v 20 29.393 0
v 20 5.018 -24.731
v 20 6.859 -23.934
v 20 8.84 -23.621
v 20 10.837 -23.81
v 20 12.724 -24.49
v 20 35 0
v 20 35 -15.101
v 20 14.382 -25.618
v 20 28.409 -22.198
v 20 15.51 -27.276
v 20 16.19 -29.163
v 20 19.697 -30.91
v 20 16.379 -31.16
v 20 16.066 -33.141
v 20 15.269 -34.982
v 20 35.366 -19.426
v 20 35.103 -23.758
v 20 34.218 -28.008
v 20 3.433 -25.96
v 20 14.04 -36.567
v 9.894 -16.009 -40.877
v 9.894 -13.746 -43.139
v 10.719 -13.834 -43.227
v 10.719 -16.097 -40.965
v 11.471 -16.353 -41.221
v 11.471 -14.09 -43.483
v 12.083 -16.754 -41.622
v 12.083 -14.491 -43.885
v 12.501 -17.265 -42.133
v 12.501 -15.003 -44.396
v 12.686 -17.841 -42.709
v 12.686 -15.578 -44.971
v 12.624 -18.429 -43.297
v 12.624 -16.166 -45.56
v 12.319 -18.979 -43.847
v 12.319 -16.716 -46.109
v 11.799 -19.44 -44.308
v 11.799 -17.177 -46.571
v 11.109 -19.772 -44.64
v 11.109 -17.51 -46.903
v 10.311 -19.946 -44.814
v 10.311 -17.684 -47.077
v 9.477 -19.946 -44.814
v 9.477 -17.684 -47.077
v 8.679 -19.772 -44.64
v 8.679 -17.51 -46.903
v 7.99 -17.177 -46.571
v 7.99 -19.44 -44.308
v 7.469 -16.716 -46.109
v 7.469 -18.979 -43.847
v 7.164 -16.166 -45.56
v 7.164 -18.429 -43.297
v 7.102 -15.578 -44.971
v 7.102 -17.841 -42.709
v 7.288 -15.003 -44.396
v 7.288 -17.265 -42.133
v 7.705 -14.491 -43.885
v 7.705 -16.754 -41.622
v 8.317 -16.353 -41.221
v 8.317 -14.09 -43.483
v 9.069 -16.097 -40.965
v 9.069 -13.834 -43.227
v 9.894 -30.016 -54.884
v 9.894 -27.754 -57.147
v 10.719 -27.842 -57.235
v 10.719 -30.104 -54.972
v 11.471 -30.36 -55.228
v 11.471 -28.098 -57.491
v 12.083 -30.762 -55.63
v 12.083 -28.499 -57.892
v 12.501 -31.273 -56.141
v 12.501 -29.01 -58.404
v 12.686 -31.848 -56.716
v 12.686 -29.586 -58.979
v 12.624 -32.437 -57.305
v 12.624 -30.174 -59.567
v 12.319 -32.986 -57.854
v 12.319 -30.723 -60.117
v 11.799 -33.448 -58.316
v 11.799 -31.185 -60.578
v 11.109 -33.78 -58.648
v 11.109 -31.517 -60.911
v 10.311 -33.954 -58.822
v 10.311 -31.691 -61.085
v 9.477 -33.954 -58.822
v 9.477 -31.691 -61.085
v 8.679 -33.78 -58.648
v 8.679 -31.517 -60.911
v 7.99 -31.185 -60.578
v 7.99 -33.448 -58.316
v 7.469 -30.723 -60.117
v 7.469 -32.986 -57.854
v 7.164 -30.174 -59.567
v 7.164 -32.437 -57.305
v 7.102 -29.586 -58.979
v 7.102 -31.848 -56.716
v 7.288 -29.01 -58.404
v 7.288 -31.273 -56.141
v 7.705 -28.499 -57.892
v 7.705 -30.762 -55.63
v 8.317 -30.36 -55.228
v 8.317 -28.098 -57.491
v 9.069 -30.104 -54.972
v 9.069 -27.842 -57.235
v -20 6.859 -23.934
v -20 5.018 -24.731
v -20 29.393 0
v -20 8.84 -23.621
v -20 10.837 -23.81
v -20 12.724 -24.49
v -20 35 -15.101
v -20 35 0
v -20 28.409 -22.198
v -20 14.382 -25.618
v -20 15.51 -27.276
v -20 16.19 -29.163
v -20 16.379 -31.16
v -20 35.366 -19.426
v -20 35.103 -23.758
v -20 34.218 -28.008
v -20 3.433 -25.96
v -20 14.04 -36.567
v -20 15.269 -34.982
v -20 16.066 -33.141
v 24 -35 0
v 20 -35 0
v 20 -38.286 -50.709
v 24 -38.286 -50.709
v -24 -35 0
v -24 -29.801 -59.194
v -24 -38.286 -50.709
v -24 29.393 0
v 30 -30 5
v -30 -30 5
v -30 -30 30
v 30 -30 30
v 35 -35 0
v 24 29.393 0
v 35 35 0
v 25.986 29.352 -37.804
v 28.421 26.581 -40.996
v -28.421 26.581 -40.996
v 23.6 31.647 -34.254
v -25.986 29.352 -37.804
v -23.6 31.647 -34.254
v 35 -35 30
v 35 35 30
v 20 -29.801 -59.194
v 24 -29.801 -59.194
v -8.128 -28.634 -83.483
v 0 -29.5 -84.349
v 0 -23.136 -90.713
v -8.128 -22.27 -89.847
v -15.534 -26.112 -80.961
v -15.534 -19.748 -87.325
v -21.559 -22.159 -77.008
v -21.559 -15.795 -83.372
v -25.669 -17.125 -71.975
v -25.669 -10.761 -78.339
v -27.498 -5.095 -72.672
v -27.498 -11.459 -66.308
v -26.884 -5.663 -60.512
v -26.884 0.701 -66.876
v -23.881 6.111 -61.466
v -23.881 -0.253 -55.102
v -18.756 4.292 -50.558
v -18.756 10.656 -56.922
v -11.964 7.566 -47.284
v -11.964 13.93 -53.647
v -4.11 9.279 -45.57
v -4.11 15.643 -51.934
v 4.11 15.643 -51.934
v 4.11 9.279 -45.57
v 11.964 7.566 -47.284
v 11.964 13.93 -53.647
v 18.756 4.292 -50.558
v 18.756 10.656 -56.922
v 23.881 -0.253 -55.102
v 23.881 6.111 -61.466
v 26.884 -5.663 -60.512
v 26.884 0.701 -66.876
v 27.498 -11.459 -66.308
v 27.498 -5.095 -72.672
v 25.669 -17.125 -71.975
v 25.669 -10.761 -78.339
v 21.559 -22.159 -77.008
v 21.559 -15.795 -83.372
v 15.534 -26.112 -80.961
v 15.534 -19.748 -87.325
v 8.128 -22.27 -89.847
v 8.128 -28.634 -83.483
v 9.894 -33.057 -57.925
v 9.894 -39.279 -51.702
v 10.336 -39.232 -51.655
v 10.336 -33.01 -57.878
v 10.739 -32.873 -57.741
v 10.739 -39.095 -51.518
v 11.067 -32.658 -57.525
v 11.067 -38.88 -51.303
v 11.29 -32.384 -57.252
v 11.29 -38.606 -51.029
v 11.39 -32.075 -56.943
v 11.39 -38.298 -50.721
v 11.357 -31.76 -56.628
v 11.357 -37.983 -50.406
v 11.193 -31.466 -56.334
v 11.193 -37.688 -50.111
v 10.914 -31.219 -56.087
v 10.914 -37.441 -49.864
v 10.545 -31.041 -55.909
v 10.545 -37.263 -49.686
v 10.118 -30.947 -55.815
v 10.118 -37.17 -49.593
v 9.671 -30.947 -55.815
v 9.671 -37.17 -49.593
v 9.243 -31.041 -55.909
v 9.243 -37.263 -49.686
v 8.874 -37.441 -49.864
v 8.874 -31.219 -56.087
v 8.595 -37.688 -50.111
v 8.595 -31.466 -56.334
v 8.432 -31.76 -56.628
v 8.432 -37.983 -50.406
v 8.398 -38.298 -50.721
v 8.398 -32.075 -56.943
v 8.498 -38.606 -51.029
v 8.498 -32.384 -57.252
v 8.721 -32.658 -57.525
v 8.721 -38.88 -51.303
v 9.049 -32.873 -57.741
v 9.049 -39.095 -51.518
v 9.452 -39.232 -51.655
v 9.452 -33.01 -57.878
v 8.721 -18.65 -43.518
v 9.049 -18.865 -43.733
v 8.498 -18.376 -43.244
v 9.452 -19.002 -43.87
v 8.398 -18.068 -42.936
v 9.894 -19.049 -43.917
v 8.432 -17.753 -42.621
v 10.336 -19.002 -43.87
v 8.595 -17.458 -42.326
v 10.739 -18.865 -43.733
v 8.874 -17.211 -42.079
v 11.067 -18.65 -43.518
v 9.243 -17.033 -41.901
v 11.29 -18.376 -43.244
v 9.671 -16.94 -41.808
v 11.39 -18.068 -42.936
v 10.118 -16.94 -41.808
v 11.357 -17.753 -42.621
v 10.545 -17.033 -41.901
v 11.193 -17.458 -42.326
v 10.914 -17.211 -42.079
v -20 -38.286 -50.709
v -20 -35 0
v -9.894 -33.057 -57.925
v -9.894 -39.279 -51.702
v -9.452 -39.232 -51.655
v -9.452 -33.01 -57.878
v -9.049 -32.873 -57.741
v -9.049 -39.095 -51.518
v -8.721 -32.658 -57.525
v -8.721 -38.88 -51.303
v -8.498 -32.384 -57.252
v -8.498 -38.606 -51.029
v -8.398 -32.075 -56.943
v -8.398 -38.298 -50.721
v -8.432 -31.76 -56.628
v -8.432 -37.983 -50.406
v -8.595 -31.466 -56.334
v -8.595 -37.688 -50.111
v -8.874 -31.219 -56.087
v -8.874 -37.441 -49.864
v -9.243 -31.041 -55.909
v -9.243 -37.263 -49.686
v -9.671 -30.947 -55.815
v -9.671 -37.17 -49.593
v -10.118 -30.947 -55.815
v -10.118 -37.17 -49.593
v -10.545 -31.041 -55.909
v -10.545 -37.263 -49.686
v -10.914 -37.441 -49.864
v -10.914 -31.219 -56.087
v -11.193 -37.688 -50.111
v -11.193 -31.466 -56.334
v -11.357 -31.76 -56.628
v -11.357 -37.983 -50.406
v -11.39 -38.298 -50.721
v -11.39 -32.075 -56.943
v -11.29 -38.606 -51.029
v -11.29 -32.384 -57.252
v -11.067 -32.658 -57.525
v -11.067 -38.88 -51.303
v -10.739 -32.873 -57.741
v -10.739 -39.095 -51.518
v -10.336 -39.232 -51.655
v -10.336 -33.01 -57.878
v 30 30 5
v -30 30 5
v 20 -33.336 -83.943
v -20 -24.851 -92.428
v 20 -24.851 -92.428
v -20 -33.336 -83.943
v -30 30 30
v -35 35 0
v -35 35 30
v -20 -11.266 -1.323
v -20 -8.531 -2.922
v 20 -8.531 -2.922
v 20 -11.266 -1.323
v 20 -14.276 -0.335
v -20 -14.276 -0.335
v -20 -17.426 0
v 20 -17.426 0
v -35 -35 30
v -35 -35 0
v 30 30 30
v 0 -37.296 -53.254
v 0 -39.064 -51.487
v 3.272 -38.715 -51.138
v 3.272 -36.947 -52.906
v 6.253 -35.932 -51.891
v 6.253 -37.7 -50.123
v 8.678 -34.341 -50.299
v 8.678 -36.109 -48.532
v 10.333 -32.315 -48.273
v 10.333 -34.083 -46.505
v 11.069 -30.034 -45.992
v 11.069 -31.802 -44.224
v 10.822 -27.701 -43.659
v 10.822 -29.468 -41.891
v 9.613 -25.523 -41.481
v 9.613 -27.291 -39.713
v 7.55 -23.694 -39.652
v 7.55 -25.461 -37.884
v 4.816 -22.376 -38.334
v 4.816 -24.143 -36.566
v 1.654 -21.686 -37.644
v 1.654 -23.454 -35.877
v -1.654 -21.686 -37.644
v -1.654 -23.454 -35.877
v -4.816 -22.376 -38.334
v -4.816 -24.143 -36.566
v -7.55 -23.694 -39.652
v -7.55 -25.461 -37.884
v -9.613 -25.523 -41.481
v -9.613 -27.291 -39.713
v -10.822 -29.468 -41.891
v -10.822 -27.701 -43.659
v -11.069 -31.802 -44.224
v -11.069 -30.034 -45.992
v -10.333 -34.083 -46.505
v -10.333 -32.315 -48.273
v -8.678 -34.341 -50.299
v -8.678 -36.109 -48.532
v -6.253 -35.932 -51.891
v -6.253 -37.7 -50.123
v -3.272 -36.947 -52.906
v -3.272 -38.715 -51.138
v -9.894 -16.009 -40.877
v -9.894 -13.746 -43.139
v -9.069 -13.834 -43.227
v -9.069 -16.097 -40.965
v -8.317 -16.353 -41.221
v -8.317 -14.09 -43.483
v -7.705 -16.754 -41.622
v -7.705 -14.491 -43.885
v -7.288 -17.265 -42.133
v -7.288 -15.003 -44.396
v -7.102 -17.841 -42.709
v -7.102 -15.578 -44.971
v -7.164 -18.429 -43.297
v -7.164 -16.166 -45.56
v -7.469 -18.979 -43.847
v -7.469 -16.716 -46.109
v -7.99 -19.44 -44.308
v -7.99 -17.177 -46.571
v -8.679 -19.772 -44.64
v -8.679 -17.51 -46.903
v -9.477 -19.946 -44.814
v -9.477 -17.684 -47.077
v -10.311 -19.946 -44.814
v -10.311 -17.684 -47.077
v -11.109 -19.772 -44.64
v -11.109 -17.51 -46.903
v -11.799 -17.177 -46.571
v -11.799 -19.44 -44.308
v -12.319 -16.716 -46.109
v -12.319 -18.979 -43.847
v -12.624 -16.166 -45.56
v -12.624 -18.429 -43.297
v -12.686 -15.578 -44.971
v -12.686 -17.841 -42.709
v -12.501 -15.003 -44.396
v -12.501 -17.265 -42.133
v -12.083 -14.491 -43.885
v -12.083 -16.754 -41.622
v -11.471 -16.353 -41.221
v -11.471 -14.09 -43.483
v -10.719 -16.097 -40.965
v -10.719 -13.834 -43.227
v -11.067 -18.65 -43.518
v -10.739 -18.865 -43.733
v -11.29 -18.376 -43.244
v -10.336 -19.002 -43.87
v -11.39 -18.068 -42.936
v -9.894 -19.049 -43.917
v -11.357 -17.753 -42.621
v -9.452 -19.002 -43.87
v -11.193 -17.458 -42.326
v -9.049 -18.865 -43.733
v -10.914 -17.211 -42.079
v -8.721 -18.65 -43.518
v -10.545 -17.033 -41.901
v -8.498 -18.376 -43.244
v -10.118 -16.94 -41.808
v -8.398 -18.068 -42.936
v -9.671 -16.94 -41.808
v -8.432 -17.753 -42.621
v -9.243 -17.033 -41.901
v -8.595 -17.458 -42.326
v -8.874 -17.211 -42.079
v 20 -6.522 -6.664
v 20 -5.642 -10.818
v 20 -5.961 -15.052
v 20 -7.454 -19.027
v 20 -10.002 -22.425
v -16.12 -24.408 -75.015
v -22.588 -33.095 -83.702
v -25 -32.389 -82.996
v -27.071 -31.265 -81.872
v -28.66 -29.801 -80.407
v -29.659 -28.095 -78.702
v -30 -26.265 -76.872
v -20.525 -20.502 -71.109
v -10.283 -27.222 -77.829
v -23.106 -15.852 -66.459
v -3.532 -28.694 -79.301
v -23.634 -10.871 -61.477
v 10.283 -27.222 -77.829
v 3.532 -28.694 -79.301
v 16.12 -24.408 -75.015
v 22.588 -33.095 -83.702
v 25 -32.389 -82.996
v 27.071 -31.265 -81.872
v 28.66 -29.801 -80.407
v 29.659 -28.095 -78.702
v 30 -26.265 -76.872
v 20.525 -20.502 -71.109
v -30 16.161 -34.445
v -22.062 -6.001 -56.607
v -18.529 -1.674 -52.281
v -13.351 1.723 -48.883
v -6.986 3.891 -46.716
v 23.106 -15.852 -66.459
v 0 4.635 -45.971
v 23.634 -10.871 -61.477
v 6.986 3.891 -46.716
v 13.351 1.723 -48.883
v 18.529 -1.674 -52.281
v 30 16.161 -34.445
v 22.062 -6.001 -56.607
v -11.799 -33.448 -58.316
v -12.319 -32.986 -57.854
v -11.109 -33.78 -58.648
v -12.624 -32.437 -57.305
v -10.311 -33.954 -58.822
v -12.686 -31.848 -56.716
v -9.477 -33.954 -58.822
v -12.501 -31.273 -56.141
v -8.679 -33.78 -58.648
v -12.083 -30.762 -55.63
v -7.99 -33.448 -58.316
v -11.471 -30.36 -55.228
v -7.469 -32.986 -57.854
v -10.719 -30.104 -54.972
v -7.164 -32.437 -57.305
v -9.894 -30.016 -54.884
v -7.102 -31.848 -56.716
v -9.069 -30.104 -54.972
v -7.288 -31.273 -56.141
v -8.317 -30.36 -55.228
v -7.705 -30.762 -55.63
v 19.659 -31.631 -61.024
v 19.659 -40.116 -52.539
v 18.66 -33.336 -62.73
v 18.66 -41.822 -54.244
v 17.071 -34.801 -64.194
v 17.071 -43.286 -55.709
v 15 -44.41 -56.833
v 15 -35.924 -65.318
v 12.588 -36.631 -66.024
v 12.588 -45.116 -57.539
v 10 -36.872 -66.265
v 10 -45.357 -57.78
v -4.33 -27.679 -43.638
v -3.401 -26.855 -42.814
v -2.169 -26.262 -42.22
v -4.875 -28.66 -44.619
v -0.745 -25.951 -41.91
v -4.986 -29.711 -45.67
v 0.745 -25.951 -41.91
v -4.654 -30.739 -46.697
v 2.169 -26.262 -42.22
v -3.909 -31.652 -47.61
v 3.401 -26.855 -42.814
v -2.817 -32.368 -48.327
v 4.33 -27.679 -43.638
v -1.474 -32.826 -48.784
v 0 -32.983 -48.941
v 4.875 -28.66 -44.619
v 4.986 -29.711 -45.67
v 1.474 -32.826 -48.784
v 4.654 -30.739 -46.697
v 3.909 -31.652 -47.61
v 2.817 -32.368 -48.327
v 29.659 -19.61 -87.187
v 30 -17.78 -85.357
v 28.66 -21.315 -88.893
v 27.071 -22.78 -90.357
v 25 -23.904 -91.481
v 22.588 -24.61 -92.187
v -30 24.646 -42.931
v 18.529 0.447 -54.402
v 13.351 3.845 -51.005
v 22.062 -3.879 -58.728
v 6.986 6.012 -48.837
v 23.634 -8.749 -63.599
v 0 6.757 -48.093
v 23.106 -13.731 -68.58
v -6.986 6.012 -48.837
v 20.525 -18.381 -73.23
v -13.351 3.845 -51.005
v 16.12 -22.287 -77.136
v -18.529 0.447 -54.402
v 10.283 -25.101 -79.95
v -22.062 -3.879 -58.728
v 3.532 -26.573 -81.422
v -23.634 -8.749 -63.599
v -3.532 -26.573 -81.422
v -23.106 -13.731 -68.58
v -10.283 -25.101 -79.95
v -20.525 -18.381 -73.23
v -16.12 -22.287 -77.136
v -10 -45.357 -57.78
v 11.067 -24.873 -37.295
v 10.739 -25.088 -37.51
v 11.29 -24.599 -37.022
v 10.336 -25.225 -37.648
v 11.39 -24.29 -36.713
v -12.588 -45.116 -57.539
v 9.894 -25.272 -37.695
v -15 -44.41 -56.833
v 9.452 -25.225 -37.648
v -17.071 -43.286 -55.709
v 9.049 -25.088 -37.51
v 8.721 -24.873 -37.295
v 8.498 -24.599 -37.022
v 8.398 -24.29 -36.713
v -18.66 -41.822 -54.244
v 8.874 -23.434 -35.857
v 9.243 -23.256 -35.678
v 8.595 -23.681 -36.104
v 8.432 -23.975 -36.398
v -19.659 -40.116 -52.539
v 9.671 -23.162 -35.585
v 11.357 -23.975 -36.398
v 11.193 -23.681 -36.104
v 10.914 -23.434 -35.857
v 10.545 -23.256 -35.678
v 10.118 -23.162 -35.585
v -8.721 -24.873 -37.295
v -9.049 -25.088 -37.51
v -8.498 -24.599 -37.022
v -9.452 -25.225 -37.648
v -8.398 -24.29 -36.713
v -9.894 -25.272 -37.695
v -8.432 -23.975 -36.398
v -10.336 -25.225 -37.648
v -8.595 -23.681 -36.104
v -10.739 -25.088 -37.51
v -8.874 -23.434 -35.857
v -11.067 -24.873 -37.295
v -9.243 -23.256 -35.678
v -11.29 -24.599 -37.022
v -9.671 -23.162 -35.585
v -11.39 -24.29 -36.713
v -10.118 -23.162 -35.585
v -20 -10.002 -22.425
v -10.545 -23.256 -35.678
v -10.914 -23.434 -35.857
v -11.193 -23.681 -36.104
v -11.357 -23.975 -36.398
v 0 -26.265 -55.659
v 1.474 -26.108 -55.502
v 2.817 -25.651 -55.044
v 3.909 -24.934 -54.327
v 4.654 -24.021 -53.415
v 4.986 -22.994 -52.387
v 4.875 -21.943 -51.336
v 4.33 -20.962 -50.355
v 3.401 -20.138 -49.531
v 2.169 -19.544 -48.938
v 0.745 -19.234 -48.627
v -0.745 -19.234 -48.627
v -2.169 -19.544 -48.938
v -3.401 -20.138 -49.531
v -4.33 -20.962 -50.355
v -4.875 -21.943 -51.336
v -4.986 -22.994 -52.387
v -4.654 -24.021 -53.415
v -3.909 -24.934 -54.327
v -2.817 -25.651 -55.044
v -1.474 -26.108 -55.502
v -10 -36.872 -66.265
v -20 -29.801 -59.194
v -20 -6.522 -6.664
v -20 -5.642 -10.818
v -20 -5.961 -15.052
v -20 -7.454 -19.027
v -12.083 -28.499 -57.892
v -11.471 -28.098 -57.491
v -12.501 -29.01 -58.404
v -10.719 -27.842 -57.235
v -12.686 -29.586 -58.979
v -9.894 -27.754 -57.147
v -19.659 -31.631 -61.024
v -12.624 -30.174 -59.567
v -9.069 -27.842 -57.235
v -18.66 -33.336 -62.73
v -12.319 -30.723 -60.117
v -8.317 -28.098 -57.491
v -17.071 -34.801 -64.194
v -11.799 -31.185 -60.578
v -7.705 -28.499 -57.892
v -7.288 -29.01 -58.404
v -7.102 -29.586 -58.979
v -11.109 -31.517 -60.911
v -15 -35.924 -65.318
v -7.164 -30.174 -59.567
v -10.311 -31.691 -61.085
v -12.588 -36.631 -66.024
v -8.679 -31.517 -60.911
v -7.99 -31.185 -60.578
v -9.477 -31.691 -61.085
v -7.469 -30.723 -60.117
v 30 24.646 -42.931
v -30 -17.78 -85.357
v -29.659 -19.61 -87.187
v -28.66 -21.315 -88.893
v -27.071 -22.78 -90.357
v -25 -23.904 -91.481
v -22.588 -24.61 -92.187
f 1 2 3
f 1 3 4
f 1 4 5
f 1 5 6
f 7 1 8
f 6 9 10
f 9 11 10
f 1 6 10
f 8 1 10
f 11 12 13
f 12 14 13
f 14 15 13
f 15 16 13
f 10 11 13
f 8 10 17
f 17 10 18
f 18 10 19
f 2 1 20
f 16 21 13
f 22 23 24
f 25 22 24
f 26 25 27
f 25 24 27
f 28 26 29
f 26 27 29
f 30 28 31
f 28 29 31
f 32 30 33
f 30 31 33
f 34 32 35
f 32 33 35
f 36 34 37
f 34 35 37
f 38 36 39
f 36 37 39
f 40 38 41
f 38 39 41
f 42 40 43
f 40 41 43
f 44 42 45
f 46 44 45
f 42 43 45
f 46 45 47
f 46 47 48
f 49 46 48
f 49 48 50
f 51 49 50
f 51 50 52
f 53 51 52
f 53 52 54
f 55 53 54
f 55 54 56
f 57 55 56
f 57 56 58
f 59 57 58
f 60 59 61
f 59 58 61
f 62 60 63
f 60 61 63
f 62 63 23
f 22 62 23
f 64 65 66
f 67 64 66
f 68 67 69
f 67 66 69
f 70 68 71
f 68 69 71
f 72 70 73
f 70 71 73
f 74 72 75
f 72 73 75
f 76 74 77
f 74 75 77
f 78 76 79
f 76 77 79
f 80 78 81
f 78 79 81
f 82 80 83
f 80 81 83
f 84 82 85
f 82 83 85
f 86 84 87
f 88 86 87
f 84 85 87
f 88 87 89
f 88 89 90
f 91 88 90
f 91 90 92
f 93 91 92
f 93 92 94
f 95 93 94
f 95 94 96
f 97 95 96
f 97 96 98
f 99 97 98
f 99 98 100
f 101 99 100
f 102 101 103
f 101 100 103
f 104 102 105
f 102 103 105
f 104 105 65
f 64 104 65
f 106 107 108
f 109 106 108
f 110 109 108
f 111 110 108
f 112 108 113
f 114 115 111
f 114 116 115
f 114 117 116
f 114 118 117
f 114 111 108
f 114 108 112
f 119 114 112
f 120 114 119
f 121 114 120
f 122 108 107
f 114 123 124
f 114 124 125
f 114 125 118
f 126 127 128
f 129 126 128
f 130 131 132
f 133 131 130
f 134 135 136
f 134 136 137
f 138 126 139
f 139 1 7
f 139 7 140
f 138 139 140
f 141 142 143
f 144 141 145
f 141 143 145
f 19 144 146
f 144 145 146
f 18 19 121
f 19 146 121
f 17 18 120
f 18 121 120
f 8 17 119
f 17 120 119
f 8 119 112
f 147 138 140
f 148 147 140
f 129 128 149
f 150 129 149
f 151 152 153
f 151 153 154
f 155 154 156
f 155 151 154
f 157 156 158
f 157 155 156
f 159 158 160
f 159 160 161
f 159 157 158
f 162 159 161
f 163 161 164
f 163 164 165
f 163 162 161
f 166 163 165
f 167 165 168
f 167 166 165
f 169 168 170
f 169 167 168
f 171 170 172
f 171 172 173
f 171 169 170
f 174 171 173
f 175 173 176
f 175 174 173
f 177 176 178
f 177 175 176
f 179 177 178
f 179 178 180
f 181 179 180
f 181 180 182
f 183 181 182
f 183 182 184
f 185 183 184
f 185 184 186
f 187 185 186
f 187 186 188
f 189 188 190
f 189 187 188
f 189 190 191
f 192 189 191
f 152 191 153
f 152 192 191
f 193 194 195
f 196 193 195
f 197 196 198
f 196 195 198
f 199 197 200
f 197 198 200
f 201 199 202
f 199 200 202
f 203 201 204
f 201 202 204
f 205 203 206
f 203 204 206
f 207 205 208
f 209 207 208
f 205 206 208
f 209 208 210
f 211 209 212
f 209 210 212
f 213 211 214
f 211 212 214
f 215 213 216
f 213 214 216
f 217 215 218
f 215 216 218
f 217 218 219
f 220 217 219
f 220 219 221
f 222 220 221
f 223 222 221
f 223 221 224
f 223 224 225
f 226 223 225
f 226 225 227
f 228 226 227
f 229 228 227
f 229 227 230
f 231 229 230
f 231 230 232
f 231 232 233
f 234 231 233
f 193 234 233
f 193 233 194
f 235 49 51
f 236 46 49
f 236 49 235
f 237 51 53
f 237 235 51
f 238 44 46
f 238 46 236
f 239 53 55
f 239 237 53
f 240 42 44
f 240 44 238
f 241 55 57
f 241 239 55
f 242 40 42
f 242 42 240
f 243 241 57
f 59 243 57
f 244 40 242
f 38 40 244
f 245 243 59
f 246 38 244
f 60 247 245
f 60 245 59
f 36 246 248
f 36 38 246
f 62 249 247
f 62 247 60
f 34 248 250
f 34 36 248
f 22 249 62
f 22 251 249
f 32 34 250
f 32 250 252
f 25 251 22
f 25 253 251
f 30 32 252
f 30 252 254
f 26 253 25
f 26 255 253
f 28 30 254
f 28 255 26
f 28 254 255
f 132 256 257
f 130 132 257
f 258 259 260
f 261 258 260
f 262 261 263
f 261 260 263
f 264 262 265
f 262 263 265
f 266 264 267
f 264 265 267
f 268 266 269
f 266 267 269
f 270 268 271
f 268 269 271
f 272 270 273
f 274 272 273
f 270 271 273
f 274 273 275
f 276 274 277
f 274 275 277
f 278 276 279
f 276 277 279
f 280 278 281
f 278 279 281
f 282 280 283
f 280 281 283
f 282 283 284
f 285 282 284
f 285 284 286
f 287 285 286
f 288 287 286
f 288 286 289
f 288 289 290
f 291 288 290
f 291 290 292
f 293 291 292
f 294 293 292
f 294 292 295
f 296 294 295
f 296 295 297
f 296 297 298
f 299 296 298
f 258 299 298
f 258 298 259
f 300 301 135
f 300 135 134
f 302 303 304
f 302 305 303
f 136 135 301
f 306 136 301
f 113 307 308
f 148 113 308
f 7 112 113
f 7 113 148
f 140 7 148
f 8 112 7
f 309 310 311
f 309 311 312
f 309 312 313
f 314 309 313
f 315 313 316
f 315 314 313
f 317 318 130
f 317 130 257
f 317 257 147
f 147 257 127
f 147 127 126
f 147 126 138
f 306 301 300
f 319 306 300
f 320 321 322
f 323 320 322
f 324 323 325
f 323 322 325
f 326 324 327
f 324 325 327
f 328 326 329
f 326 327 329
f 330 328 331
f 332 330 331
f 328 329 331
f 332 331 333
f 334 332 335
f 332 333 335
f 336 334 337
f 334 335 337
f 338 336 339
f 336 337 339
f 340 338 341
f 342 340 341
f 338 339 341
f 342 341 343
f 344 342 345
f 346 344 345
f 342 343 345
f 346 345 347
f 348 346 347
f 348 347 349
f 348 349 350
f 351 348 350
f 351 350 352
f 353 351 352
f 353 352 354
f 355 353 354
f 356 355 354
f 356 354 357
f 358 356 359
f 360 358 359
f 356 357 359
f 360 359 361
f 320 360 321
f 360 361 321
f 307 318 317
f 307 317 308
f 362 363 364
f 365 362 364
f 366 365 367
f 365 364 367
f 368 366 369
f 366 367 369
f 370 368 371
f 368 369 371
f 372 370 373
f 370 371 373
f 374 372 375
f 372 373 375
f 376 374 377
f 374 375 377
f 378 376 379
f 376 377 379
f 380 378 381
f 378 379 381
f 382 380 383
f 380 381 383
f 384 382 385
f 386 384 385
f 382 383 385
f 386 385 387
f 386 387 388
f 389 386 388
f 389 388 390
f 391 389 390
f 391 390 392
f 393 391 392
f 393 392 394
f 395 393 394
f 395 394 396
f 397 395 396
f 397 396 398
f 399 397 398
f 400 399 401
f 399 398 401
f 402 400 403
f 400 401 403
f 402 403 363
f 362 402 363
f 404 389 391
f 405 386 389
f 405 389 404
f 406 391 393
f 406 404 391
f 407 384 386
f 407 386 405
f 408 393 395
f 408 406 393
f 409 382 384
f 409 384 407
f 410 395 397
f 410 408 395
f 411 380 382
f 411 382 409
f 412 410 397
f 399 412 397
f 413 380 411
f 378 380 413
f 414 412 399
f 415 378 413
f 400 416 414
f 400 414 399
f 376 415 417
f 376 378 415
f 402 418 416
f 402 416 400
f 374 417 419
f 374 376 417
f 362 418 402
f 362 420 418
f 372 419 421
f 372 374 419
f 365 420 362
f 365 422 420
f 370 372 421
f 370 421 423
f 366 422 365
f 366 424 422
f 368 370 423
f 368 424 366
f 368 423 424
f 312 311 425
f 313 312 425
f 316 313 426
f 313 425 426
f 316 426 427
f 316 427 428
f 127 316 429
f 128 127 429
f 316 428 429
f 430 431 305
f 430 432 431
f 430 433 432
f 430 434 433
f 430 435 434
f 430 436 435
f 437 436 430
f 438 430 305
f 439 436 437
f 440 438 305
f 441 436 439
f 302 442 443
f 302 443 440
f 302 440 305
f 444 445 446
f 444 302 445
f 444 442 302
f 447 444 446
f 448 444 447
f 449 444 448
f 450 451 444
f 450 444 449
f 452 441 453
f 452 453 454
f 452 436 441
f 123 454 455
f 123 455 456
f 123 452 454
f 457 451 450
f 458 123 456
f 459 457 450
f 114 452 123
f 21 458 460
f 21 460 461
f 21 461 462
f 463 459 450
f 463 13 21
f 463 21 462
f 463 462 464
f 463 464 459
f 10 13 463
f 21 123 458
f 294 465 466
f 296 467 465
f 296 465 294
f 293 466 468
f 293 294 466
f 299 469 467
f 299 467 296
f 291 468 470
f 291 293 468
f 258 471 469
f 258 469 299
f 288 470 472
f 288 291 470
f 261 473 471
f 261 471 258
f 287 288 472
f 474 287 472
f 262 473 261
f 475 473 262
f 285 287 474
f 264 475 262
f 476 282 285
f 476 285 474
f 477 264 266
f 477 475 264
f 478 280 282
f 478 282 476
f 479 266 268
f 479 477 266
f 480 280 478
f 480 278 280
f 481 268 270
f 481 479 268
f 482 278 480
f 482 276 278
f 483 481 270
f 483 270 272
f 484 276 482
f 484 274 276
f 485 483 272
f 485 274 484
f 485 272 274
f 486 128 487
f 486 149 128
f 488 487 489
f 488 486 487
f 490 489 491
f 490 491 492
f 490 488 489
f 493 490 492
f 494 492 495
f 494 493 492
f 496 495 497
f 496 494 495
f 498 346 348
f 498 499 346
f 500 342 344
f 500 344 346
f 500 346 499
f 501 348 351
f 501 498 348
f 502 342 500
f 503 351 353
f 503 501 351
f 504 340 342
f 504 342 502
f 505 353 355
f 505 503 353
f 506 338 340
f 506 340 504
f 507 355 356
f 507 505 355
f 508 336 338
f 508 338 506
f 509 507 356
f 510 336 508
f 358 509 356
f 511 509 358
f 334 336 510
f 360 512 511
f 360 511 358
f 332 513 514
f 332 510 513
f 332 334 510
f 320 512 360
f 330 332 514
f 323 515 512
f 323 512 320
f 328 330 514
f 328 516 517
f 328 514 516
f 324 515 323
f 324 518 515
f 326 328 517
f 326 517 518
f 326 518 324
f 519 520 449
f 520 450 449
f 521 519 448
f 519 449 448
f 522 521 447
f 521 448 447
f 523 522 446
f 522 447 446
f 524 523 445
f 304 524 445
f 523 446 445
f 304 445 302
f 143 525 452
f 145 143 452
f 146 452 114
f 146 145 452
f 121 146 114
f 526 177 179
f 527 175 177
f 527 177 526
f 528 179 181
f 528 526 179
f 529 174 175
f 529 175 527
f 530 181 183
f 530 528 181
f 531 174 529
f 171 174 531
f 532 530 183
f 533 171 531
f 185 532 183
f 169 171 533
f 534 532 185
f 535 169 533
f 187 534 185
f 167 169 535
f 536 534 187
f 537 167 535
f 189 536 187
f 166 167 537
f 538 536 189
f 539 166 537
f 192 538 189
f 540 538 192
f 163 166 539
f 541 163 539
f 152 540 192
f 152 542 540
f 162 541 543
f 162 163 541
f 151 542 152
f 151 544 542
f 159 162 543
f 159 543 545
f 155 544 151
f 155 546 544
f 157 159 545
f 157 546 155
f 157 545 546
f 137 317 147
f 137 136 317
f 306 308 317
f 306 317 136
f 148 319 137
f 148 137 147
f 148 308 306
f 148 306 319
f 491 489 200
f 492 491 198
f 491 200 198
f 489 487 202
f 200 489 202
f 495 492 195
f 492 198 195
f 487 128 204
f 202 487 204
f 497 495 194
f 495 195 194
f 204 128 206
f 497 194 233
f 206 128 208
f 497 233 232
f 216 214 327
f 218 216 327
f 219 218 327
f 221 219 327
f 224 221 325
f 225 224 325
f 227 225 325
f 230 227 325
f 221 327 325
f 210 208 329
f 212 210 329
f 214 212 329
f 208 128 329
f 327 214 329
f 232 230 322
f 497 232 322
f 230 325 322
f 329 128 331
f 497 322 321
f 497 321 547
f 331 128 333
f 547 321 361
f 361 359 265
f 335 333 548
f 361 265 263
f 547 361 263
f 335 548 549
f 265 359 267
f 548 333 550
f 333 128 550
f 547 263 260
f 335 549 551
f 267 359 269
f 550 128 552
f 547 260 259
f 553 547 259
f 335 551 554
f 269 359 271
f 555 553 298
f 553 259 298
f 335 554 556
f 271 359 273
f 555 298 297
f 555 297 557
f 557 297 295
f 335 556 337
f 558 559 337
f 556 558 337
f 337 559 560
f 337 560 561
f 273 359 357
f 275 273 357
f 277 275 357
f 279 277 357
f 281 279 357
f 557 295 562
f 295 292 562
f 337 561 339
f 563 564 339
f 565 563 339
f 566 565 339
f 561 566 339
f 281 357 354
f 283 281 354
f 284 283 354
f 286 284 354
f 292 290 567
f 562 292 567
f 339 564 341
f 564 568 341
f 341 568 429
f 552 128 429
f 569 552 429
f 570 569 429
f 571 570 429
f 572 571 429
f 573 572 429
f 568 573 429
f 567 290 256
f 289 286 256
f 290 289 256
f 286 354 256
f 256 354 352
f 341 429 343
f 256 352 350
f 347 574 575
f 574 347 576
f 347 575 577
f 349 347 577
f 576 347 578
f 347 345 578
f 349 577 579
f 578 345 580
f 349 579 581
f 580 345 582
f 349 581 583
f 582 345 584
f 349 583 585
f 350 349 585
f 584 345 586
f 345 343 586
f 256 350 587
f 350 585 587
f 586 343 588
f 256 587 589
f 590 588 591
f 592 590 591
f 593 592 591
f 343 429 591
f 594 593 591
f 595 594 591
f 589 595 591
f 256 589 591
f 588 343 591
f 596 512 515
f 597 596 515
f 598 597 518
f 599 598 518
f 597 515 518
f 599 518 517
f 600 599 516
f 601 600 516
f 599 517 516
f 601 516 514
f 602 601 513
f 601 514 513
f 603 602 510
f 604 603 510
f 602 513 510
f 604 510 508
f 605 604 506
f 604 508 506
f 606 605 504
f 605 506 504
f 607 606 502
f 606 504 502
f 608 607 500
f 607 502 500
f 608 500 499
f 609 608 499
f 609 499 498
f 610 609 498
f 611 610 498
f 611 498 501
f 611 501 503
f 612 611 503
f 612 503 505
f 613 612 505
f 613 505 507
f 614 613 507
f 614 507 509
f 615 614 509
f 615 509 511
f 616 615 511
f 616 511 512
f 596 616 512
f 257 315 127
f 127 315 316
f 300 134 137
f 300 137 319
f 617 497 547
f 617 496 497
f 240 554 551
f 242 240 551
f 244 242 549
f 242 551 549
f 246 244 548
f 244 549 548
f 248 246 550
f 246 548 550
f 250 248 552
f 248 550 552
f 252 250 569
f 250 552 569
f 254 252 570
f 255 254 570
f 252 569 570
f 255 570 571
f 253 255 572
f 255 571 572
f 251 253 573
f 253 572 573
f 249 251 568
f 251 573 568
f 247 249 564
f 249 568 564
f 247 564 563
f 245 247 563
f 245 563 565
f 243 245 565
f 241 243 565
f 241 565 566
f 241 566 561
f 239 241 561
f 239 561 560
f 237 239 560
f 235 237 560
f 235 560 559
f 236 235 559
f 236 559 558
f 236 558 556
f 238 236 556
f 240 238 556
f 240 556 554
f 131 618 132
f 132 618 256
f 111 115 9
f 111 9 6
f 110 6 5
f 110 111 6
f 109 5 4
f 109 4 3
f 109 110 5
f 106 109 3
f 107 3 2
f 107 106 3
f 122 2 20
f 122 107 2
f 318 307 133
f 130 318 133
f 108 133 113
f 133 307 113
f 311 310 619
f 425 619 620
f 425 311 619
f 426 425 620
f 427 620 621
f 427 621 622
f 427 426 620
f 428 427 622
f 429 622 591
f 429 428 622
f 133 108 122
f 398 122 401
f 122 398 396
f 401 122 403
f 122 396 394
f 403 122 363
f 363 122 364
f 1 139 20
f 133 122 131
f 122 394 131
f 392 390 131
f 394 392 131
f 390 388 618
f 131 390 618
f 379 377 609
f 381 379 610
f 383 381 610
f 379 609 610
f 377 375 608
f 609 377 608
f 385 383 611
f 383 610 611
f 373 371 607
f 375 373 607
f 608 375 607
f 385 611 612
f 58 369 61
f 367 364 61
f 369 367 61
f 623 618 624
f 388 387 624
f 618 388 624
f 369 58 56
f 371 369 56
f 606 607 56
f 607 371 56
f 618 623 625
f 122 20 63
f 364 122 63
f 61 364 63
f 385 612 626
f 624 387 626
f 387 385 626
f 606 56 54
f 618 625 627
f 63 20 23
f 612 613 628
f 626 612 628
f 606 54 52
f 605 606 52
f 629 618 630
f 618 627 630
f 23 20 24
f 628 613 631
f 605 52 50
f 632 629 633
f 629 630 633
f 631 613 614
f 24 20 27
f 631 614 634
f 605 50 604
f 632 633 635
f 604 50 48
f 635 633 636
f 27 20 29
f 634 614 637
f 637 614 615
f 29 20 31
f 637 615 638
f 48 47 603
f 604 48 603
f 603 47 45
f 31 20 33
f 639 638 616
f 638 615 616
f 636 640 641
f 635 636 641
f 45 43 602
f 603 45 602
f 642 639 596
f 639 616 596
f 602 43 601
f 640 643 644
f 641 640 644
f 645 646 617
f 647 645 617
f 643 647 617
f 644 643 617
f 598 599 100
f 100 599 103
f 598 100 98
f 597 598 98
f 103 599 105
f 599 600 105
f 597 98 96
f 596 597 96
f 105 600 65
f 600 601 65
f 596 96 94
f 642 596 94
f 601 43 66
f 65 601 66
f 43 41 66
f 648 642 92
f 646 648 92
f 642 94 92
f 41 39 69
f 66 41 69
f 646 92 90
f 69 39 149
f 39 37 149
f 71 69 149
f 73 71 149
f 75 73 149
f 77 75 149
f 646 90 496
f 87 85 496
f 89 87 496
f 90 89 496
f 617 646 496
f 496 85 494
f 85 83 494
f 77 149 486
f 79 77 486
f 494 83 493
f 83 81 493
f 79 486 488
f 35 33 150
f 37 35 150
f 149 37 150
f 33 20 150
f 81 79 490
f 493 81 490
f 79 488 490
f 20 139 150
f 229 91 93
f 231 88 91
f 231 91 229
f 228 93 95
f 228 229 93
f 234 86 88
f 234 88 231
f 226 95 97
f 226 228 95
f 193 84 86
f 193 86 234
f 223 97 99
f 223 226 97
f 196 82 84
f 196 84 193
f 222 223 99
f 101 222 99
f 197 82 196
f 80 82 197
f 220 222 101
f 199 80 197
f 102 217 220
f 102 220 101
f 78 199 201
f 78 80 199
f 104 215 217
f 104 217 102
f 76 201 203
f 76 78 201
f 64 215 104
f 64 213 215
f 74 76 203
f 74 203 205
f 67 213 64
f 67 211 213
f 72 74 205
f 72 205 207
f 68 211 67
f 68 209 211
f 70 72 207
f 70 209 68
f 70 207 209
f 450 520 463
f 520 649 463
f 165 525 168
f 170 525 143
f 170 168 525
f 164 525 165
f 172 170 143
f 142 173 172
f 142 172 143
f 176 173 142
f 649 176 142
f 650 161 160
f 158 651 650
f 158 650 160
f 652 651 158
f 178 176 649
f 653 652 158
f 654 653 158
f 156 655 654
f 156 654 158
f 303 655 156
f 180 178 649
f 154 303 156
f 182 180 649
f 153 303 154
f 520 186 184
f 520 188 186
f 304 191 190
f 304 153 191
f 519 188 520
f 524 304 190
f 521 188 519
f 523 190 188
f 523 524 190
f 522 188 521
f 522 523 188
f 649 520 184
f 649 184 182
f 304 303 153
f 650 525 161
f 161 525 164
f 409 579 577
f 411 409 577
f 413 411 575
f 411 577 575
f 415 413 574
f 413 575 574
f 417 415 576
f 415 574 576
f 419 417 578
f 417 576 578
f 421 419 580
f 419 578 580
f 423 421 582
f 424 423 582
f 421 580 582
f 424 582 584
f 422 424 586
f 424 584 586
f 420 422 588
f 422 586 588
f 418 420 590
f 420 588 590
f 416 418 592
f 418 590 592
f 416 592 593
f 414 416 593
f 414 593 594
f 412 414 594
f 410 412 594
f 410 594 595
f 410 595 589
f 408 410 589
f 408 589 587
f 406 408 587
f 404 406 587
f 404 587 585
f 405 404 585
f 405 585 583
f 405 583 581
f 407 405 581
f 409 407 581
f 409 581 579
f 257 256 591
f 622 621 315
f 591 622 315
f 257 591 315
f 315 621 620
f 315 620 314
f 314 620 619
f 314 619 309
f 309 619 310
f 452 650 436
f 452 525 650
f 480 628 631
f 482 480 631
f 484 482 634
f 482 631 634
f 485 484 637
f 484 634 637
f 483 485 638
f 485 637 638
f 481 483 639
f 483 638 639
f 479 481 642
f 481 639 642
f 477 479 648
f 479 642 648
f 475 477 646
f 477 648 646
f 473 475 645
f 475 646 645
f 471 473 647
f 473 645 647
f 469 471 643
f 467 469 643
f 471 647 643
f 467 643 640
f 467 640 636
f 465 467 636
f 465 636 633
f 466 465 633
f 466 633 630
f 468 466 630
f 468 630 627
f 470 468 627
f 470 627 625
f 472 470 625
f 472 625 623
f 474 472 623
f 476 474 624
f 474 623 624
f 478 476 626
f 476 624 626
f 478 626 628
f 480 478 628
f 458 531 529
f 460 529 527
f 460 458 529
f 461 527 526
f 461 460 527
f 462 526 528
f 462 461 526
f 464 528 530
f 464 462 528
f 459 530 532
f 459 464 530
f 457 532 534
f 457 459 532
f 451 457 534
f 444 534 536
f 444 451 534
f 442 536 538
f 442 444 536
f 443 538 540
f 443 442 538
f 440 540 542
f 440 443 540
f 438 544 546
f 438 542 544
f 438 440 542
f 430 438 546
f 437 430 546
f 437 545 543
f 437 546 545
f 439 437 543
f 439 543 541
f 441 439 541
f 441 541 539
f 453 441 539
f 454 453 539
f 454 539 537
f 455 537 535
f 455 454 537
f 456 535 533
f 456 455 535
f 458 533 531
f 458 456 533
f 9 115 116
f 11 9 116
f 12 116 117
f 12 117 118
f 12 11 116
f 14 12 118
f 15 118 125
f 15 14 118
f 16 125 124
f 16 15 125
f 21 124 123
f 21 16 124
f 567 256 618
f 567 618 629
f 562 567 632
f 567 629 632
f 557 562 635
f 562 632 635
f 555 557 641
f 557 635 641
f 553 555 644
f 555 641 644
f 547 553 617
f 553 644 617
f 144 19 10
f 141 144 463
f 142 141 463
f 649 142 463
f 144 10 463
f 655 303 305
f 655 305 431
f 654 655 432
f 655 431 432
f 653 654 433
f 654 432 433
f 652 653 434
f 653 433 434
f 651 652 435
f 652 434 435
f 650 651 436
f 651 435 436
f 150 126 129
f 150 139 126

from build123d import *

# Parameters (mm, degrees)
SCHIZZO1_W                   = 70
SCHIZZO1_H                   = 70
SCHIZZO1_W_2                 = 60
SCHIZZO1_H_2                 = 60
ESTRUSIONE_ESTRUSIONE1_DEPTH = 30
SCHIZZO2_W                   = 70
SCHIZZO2_H                   = 70
ESTRUSIONE_ESTRUSIONE2_DEPTH = 5
SCHIZZO3_W                   = 40
SCHIZZO3_H                   = 20
ESTRUSIONE_ESTRUSIONE3_DEPTH = 25
SMUSSO1_SIZE                 = 20
SCHIZZO4_W                   = 60
SCHIZZO4_H                   = 12
SCHIZZO4_W_2                 = 40
ESTRUSIONE_ESTRUSIONE4_DEPTH = 80
SCHIZZO19_W                  = 60
SCHIZZO19_H                  = 12
ESTRUSIONE_ESTRUSIONE7_DEPTH = 10
TAGLIO_ESTRUSIONE1_START     = 3
SCHIZZO6_R                   = 27.575
TAGLIO_ESTRUSIONE1_DEPTH     = 9
TAGLIO_ESTRUSIONE2_REACH     = 105.555
SCHIZZO7_R                   = 23.7
SCHIZZO9_R                   = 11.1
TAGLIO_ESTRUSIONE3_DEPTH     = 2.5
TAGLIO_ESTRUSIONE4_REACH     = 108.384
SCHIZZO10_R                  = 1.5
SCHIZZO11_R                  = 2.8
TAGLIO_ESTRUSIONE5_DEPTH     = 3.2
TAGLIO_ESTRUSIONE6_REACH     = 107.837
SCHIZZO12_R                  = 5
SCHIZZO13_W                  = 40
SCHIZZO13_H                  = 54
ESTRUSIONE_ESTRUSIONE5_DEPTH = 7
SCHIZZO17_W                  = 40
SCHIZZO17_H                  = 45
ESTRUSIONE_ESTRUSIONE6_DEPTH = 15
RACCORDO4_R                  = 10
SCHIZZO18_W                  = 60
SCHIZZO18_H                  = 60
TAGLIO_ESTRUSIONE10_DEPTH    = 114.024428621
SMUSSO2_SIZE                 = 20
SMUSSO2_SIZE_2               = 11.547005384
RACCORDO5_R                  = 30
RACCORDO6_R                  = 8
RACCORDO7_R                  = 15
ESTRUSIONE_ESTRUSIONE8_START = 20
ESTRUSIONE_ESTRUSIONE8_DEPTH = 4
ESTRUSIONE_ESTRUSIONE9_START = -20
ESTRUSIONE_ESTRUSIONE9_DEPTH = 4


# Some blends are built 0.0001 mm under size
with BuildPart() as part:
    # Schizzo1 → Estrusione-Estrusione1 (new body)
    with BuildSketch(Plane.XY):
        Rectangle(SCHIZZO1_W, SCHIZZO1_H)
        Rectangle(SCHIZZO1_W_2, SCHIZZO1_H_2, mode=Mode.SUBTRACT)
    extrude(amount=ESTRUSIONE_ESTRUSIONE1_DEPTH)

    # Schizzo2 → Estrusione-Estrusione2 (add)
    with BuildSketch(Plane.XY):
        Rectangle(SCHIZZO2_W, SCHIZZO2_H)
    extrude(amount=ESTRUSIONE_ESTRUSIONE2_DEPTH)

    # Schizzo3 → Estrusione-Estrusione3 (add)
    with BuildSketch(Plane(origin=(0, 0, 0), x_dir=(-1, 0, 0), z_dir=(0, 0, -1))):
        with Locations((0, 25)):
            Rectangle(SCHIZZO3_W, SCHIZZO3_H)
    extrude(amount=ESTRUSIONE_ESTRUSIONE3_DEPTH)

    # Smusso1
    smusso1_edges = [part.edges().sort_by_distance(p)[0] for p in [
        (0, 15, -25),
    ]]
    chamfer(smusso1_edges, length=SMUSSO1_SIZE - 0.0001)  # a hair under: the kernel refuses the full size

    # Schizzo4 → Estrusione-Estrusione4 (add)
    with BuildSketch(Plane(origin=(0, 5, 5), x_dir=(-1, 0, 0), z_dir=(0, -0.7071067811865487, -0.7071067811865464))):
        with Locations((0, 41.784271247)):
            Rectangle(SCHIZZO4_W, SCHIZZO4_H)
        with Locations((0, 14.784271247)):
            Rectangle(SCHIZZO4_W_2, SCHIZZO4_H)
    extrude(amount=ESTRUSIONE_ESTRUSIONE4_DEPTH)

    # Schizzo19 → Estrusione-Estrusione7 (add)
    with BuildSketch(Plane(origin=(0, -51.568542495, -51.568542495), x_dir=(1, 0, 0), z_dir=(0, -0.7071067811865488, -0.7071067811865464))):
        with Locations((0, -41.784271247)):
            Rectangle(SCHIZZO19_W, SCHIZZO19_H)
    extrude(amount=ESTRUSIONE_ESTRUSIONE7_DEPTH)

    # Schizzo6 → Taglio-Estrusione1 (cut)
    with BuildSketch(Plane(origin=(0, 25.303300859, -25.303300859), x_dir=(1, 0, 0), z_dir=(0, 0.7071067811865465, -0.7071067811865486)).offset(TAGLIO_ESTRUSIONE1_START)):
        with Locations(Location((0, 52.928932188, 0), (0, 0, 90))):
            Circle(SCHIZZO6_R)
    extrude(amount=TAGLIO_ESTRUSIONE1_DEPTH, mode=Mode.SUBTRACT)

    # Schizzo7 → Taglio-Estrusione2 (cut, up to next)
    with BuildSketch(Plane(origin=(0, 25.303300859, -25.303300859), x_dir=(1, 0, 0), z_dir=(0, 0.7071067811865464, -0.7071067811865487)), mode=Mode.PRIVATE) as taglio_estrusione2_sk1:
        with Locations(Location((0, 52.928932188, 0), (0, 0, 270))):
            Circle(SCHIZZO7_R)
    taglio_estrusione2_tool1 = extrude(taglio_estrusione2_sk1.sketch, amount=TAGLIO_ESTRUSIONE2_REACH, mode=Mode.PRIVATE) & part.part
    add(taglio_estrusione2_tool1.solids().sort_by_distance((0, -12.123106, -62.729708))[0], mode=Mode.SUBTRACT)

    # Schizzo9 → Taglio-Estrusione3 (cut)
    with BuildSketch(Plane(origin=(0, 6.211417767, -6.211417767), x_dir=(1, 0, 0), z_dir=(0, -0.7071067811865464, 0.7071067811865487))):
        with Locations(Location((0, -52.928932188, 0), (0, 0, 270))):
            Circle(SCHIZZO9_R)
    extrude(amount=-TAGLIO_ESTRUSIONE3_DEPTH, mode=Mode.SUBTRACT)

    # Schizzo10 → Taglio-Estrusione4 (cut, up to next)
    with BuildSketch(Plane(origin=(0, 6.211417767, -6.211417767), x_dir=(1, 0, 0), z_dir=(0, -0.7071067811865464, 0.7071067811865487)), mode=Mode.PRIVATE) as taglio_estrusione4_sk1:
        with Locations(Location((-9.89414905, -43.02409425, 0), (0, 0, 270))):
            Circle(SCHIZZO10_R)
    taglio_estrusione4_tool1 = extrude(taglio_estrusione4_sk1.sketch, amount=-TAGLIO_ESTRUSIONE4_REACH, mode=Mode.PRIVATE) & part.part
    # Schizzo10 → Taglio-Estrusione4 (cut, up to next)
    with BuildSketch(Plane(origin=(0, 6.211417767, -6.211417767), x_dir=(1, 0, 0), z_dir=(0, -0.7071067811865464, 0.7071067811865487)), mode=Mode.PRIVATE) as taglio_estrusione4_sk2:
        with Locations(Location((9.89414905, -43.02409425, 0), (0, 0, 270))):
            Circle(SCHIZZO10_R)
    taglio_estrusione4_tool2 = extrude(taglio_estrusione4_sk2.sketch, amount=-TAGLIO_ESTRUSIONE4_REACH, mode=Mode.PRIVATE) & part.part
    # Schizzo10 → Taglio-Estrusione4 (cut, up to next)
    with BuildSketch(Plane(origin=(0, 6.211417767, -6.211417767), x_dir=(1, 0, 0), z_dir=(0, -0.7071067811865464, 0.7071067811865487)), mode=Mode.PRIVATE) as taglio_estrusione4_sk3:
        with Locations(Location((9.89414905, -62.833770126, 0), (0, 0, 270))):
            Circle(SCHIZZO10_R)
    taglio_estrusione4_tool3 = extrude(taglio_estrusione4_sk3.sketch, amount=-TAGLIO_ESTRUSIONE4_REACH, mode=Mode.PRIVATE) & part.part
    # Schizzo10 → Taglio-Estrusione4 (cut, up to next)
    with BuildSketch(Plane(origin=(0, 6.211417767, -6.211417767), x_dir=(1, 0, 0), z_dir=(0, -0.7071067811865464, 0.7071067811865487)), mode=Mode.PRIVATE) as taglio_estrusione4_sk4:
        with Locations(Location((-9.89414905, -62.833770126, 0), (0, 0, 270))):
            Circle(SCHIZZO10_R)
    taglio_estrusione4_tool4 = extrude(taglio_estrusione4_sk4.sketch, amount=-TAGLIO_ESTRUSIONE4_REACH, mode=Mode.PRIVATE) & part.part
    add(taglio_estrusione4_tool1.solids().sort_by_distance((-9.894149, -24.211211, -36.634047))[0], mode=Mode.SUBTRACT)
    add(taglio_estrusione4_tool2.solids().sort_by_distance((9.894149, -24.211211, -36.634047))[0], mode=Mode.SUBTRACT)
    add(taglio_estrusione4_tool3.solids().sort_by_distance((9.894149, -38.218767, -50.641603))[0], mode=Mode.SUBTRACT)
    add(taglio_estrusione4_tool4.solids().sort_by_distance((-9.894149, -38.218767, -50.641603))[0], mode=Mode.SUBTRACT)

    # Schizzo11 → Taglio-Estrusione5 (cut)
    with BuildSketch(Plane(origin=(0, 14.696699141, -14.696699141), x_dir=(1, 0, 0), z_dir=(0, 0.7071067811865464, -0.7071067811865487))):
        with Locations(Location((-9.89414905, 62.833770126, 0), (0, 0, 270))):
            Circle(SCHIZZO11_R)
        with Locations(Location((-9.89414905, 43.02409425, 0), (0, 0, 270))):
            Circle(SCHIZZO11_R)
        with Locations(Location((9.89414905, 62.833770126, 0), (0, 0, 270))):
            Circle(SCHIZZO11_R)
        with Locations(Location((9.89414905, 43.02409425, 0), (0, 0, 270))):
            Circle(SCHIZZO11_R)
    extrude(amount=-TAGLIO_ESTRUSIONE5_DEPTH, mode=Mode.SUBTRACT)

    # Schizzo12 → Taglio-Estrusione6 (cut, up to next)
    with BuildSketch(Plane(origin=(0, 7.97918472, -7.97918472), x_dir=(1, 0, 0), z_dir=(0, -0.7071067811865464, 0.7071067811865487)), mode=Mode.PRIVATE) as taglio_estrusione6_sk1:
        with Locations(Location((0, -52.928932188, 0), (0, 0, 270))):
            Circle(SCHIZZO12_R)
    taglio_estrusione6_tool1 = extrude(taglio_estrusione6_sk1.sketch, amount=-TAGLIO_ESTRUSIONE6_REACH, mode=Mode.PRIVATE) & part.part
    add(taglio_estrusione6_tool1.solids().sort_by_distance((0, -29.447222, -45.405592))[0], mode=Mode.SUBTRACT)

    # Schizzo13 → Estrusione-Estrusione5 (add)
    with BuildSketch(Plane(origin=(0, 5, 5), x_dir=(1, 0, 0), z_dir=(0, 0.7071067811865488, 0.7071067811865464))):
        with Locations((0, 20.784271247)):
            Rectangle(SCHIZZO13_W, SCHIZZO13_H)
    extrude(amount=ESTRUSIONE_ESTRUSIONE5_DEPTH)

    # Schizzo17 → Estrusione-Estrusione6 (add)
    with BuildSketch(Plane(origin=(0, 5, 5), x_dir=(1, 0, 0), z_dir=(0, -0.7071067811865487, -0.7071067811865465))):
        with Locations((0, -13.284271247)):
            Rectangle(SCHIZZO17_W, SCHIZZO17_H)
    extrude(amount=ESTRUSIONE_ESTRUSIONE6_DEPTH)

    # Raccordo4
    raccordo4_edges = [part.edges().sort_by_distance(p)[0] for p in [
        (20, -41.114484041, -62.022600949),
        (-20, -41.114484041, -62.022600949),
        (-30, -29.093668761, -88.185551853),
        (30, -29.093668761, -88.185551853),
    ]]
    fillet(raccordo4_edges, radius=RACCORDO4_R)

    # Schizzo18 → Taglio-Estrusione10 (cut, through all)
    with BuildSketch(Plane.XY.offset(5)):
        Rectangle(SCHIZZO18_W, SCHIZZO18_H)
    extrude(amount=TAGLIO_ESTRUSIONE10_DEPTH, mode=Mode.SUBTRACT)

    # Smusso2
    # the kernel refuses this chamfer: 20, 11.547005384 mm, written as the material it takes off along each edge
    with BuildSketch(Plane(origin=(-30, 75.375499846, -65.375499846), x_dir=(-0.019326765612700806, -0.7069747082219261, -0.7069747082219237), z_dir=(0, -0.7071067811865464, 0.7071067811865487))) as smusso2_piece_1_section:
        Polygon((SMUSSO2_SIZE * 0.999813220622, SMUSSO2_SIZE * 0.0193267656127), (-SMUSSO2_SIZE_2 * 0.0193267656124, SMUSSO2_SIZE_2 * 0.999813220604), (0, 0), align=None)
    smusso2_piece_1 = extrude(amount=63.741715093, mode=Mode.PRIVATE)
    smusso2_piece_1 = split(smusso2_piece_1, bisect_by=Plane(origin=(-20, 29.75727976, -29.334603333), z_dir=(-1, 0, 0)), keep=Keep.TOP, mode=Mode.PRIVATE)
    add(smusso2_piece_1, mode=Mode.SUBTRACT)
    with BuildSketch(Plane(origin=(30, 30.303300859, -20.303300859), x_dir=(-0.9983227437537926, 0.04093714269400887, 0.04093714269400999), z_dir=(0, 0.7071067811865464, -0.7071067811865487))) as smusso2_piece_2_section:
        Polygon((SMUSSO2_SIZE_2 * 0.998322743736, -SMUSSO2_SIZE_2 * 0.0578938624016), (-SMUSSO2_SIZE * 0.0578938624027, -SMUSSO2_SIZE * 0.998322743754), (0, 0), align=None)
    smusso2_piece_2 = extrude(amount=63.741715093, mode=Mode.PRIVATE)
    smusso2_piece_2 = split(smusso2_piece_2, bisect_by=Plane(origin=(20, 29.75727976, -29.334603333), z_dir=(1, 0, 0)), keep=Keep.TOP, mode=Mode.PRIVATE)
    add(smusso2_piece_2, mode=Mode.SUBTRACT)

    # Raccordo5
    # the kernel refuses this fillet: 30 mm, written as the material it takes off along each edge
    with BuildSketch(Plane(origin=(-80.660687982, 43.738329701, -23.838834765), x_dir=(0, -0.707106781186546, 0.7071067811865489), z_dir=(1, 0, 0))) as raccordo5_piece_1:
        with BuildLine():
            CenterArc((30, 24.264275193), RACCORDO5_R, 180, 53.979747048)
            Line((0, 24.264275193), (-0.6, 24.264275193))
            Line((-0.6, 24.264275193), (-0.6, 0))
            Line((-0.6, 0), (0, -0.6))
            ThreePointArc((0, -0.6), (6.178932188, -0.6), (12.005021664, -0.485285504))
            Line((12.005021664, -0.485285504), (12.357864376, 0))
        make_face()
    extrude(amount=161.321375964, mode=Mode.SUBTRACT)

    # Raccordo6
    # the kernel refuses this fillet: 8 mm, written as the material it adds along each edge
    with BuildSketch(Plane(origin=(-20, 9.090097423, -20.303300859), x_dir=(0, 0.7071067811865467, -0.7071067811865487), z_dir=(1, 0, 0))) as raccordo6_piece_1:
        with BuildLine():
            CenterArc((RACCORDO6_R, -RACCORDO6_R), RACCORDO6_R, 90, 90)
            Line((0, -RACCORDO6_R), (0, 0))
            Line((0, 0), (RACCORDO6_R, 0))
        make_face()
    extrude(amount=40)
    with BuildSketch(Plane(origin=(20, 19.696699141, -30.909902577), x_dir=(0, -0.7071067811865491, -0.707106781186546), z_dir=(-1, 0, 0))) as raccordo6_piece_2:
        with BuildLine():
            CenterArc((RACCORDO6_R, RACCORDO6_R), RACCORDO6_R, 180, 90)
            Line((0, RACCORDO6_R), (0, 0))
            Line((0, 0), (RACCORDO6_R, 0))
        make_face()
    extrude(amount=40)

    # Raccordo7
    # the kernel refuses this fillet: 15 mm, written as the material it adds along each edge
    with BuildSketch(Plane(origin=(-20, -11.213203436, 0), x_dir=(0, -1, 0), z_dir=(1, 0, 0))) as raccordo7_piece_1:
        with BuildLine():
            CenterArc((RACCORDO7_R * 0.414213562373, RACCORDO7_R), RACCORDO7_R, 225, 45)
            Line((-RACCORDO7_R * 0.292893218813, RACCORDO7_R * 0.292893218813), (0, 0))
            Line((0, 0), (RACCORDO7_R * 0.414213562373, 0))
        make_face()
    extrude(amount=40)
    with BuildSketch(Plane(origin=(20, 0.604816049, -11.818019485), x_dir=(0, -0.7071067811865464, 0.7071067811865487), z_dir=(-1, 0, 0))) as raccordo7_piece_2:
        with BuildLine():
            CenterArc((RACCORDO7_R, -RACCORDO7_R), RACCORDO7_R, 90, 90)
            Line((0, -RACCORDO7_R), (0, 0))
            Line((0, 0), (RACCORDO7_R, 0))
        make_face()
    extrude(amount=40)

    # Schizzo20 → Estrusione-Estrusione8 (add)
    with BuildSketch(Plane(origin=(0, 0, 0), x_dir=(0, 0, -1), z_dir=(1, 0, 0)).offset(ESTRUSIONE_ESTRUSIONE8_START)):
        Polygon((0, -35), (50.70889245, -38.286056916), (59.194173824, -29.800775542), (0, 29.393398282), align=None)
    extrude(amount=ESTRUSIONE_ESTRUSIONE8_DEPTH)

    # Schizzo21 → Estrusione-Estrusione9 (add)
    with BuildSketch(Plane(origin=(0, 0, 0), x_dir=(0, 0, -1), z_dir=(1, 0, 0)).offset(ESTRUSIONE_ESTRUSIONE9_START)):
        Polygon((50.70889245, -38.286056916), (0, -35), (0, 29.393398282), (59.194173824, -29.800775542), align=None)
    extrude(amount=-ESTRUSIONE_ESTRUSIONE9_DEPTH)


solid = part.part
